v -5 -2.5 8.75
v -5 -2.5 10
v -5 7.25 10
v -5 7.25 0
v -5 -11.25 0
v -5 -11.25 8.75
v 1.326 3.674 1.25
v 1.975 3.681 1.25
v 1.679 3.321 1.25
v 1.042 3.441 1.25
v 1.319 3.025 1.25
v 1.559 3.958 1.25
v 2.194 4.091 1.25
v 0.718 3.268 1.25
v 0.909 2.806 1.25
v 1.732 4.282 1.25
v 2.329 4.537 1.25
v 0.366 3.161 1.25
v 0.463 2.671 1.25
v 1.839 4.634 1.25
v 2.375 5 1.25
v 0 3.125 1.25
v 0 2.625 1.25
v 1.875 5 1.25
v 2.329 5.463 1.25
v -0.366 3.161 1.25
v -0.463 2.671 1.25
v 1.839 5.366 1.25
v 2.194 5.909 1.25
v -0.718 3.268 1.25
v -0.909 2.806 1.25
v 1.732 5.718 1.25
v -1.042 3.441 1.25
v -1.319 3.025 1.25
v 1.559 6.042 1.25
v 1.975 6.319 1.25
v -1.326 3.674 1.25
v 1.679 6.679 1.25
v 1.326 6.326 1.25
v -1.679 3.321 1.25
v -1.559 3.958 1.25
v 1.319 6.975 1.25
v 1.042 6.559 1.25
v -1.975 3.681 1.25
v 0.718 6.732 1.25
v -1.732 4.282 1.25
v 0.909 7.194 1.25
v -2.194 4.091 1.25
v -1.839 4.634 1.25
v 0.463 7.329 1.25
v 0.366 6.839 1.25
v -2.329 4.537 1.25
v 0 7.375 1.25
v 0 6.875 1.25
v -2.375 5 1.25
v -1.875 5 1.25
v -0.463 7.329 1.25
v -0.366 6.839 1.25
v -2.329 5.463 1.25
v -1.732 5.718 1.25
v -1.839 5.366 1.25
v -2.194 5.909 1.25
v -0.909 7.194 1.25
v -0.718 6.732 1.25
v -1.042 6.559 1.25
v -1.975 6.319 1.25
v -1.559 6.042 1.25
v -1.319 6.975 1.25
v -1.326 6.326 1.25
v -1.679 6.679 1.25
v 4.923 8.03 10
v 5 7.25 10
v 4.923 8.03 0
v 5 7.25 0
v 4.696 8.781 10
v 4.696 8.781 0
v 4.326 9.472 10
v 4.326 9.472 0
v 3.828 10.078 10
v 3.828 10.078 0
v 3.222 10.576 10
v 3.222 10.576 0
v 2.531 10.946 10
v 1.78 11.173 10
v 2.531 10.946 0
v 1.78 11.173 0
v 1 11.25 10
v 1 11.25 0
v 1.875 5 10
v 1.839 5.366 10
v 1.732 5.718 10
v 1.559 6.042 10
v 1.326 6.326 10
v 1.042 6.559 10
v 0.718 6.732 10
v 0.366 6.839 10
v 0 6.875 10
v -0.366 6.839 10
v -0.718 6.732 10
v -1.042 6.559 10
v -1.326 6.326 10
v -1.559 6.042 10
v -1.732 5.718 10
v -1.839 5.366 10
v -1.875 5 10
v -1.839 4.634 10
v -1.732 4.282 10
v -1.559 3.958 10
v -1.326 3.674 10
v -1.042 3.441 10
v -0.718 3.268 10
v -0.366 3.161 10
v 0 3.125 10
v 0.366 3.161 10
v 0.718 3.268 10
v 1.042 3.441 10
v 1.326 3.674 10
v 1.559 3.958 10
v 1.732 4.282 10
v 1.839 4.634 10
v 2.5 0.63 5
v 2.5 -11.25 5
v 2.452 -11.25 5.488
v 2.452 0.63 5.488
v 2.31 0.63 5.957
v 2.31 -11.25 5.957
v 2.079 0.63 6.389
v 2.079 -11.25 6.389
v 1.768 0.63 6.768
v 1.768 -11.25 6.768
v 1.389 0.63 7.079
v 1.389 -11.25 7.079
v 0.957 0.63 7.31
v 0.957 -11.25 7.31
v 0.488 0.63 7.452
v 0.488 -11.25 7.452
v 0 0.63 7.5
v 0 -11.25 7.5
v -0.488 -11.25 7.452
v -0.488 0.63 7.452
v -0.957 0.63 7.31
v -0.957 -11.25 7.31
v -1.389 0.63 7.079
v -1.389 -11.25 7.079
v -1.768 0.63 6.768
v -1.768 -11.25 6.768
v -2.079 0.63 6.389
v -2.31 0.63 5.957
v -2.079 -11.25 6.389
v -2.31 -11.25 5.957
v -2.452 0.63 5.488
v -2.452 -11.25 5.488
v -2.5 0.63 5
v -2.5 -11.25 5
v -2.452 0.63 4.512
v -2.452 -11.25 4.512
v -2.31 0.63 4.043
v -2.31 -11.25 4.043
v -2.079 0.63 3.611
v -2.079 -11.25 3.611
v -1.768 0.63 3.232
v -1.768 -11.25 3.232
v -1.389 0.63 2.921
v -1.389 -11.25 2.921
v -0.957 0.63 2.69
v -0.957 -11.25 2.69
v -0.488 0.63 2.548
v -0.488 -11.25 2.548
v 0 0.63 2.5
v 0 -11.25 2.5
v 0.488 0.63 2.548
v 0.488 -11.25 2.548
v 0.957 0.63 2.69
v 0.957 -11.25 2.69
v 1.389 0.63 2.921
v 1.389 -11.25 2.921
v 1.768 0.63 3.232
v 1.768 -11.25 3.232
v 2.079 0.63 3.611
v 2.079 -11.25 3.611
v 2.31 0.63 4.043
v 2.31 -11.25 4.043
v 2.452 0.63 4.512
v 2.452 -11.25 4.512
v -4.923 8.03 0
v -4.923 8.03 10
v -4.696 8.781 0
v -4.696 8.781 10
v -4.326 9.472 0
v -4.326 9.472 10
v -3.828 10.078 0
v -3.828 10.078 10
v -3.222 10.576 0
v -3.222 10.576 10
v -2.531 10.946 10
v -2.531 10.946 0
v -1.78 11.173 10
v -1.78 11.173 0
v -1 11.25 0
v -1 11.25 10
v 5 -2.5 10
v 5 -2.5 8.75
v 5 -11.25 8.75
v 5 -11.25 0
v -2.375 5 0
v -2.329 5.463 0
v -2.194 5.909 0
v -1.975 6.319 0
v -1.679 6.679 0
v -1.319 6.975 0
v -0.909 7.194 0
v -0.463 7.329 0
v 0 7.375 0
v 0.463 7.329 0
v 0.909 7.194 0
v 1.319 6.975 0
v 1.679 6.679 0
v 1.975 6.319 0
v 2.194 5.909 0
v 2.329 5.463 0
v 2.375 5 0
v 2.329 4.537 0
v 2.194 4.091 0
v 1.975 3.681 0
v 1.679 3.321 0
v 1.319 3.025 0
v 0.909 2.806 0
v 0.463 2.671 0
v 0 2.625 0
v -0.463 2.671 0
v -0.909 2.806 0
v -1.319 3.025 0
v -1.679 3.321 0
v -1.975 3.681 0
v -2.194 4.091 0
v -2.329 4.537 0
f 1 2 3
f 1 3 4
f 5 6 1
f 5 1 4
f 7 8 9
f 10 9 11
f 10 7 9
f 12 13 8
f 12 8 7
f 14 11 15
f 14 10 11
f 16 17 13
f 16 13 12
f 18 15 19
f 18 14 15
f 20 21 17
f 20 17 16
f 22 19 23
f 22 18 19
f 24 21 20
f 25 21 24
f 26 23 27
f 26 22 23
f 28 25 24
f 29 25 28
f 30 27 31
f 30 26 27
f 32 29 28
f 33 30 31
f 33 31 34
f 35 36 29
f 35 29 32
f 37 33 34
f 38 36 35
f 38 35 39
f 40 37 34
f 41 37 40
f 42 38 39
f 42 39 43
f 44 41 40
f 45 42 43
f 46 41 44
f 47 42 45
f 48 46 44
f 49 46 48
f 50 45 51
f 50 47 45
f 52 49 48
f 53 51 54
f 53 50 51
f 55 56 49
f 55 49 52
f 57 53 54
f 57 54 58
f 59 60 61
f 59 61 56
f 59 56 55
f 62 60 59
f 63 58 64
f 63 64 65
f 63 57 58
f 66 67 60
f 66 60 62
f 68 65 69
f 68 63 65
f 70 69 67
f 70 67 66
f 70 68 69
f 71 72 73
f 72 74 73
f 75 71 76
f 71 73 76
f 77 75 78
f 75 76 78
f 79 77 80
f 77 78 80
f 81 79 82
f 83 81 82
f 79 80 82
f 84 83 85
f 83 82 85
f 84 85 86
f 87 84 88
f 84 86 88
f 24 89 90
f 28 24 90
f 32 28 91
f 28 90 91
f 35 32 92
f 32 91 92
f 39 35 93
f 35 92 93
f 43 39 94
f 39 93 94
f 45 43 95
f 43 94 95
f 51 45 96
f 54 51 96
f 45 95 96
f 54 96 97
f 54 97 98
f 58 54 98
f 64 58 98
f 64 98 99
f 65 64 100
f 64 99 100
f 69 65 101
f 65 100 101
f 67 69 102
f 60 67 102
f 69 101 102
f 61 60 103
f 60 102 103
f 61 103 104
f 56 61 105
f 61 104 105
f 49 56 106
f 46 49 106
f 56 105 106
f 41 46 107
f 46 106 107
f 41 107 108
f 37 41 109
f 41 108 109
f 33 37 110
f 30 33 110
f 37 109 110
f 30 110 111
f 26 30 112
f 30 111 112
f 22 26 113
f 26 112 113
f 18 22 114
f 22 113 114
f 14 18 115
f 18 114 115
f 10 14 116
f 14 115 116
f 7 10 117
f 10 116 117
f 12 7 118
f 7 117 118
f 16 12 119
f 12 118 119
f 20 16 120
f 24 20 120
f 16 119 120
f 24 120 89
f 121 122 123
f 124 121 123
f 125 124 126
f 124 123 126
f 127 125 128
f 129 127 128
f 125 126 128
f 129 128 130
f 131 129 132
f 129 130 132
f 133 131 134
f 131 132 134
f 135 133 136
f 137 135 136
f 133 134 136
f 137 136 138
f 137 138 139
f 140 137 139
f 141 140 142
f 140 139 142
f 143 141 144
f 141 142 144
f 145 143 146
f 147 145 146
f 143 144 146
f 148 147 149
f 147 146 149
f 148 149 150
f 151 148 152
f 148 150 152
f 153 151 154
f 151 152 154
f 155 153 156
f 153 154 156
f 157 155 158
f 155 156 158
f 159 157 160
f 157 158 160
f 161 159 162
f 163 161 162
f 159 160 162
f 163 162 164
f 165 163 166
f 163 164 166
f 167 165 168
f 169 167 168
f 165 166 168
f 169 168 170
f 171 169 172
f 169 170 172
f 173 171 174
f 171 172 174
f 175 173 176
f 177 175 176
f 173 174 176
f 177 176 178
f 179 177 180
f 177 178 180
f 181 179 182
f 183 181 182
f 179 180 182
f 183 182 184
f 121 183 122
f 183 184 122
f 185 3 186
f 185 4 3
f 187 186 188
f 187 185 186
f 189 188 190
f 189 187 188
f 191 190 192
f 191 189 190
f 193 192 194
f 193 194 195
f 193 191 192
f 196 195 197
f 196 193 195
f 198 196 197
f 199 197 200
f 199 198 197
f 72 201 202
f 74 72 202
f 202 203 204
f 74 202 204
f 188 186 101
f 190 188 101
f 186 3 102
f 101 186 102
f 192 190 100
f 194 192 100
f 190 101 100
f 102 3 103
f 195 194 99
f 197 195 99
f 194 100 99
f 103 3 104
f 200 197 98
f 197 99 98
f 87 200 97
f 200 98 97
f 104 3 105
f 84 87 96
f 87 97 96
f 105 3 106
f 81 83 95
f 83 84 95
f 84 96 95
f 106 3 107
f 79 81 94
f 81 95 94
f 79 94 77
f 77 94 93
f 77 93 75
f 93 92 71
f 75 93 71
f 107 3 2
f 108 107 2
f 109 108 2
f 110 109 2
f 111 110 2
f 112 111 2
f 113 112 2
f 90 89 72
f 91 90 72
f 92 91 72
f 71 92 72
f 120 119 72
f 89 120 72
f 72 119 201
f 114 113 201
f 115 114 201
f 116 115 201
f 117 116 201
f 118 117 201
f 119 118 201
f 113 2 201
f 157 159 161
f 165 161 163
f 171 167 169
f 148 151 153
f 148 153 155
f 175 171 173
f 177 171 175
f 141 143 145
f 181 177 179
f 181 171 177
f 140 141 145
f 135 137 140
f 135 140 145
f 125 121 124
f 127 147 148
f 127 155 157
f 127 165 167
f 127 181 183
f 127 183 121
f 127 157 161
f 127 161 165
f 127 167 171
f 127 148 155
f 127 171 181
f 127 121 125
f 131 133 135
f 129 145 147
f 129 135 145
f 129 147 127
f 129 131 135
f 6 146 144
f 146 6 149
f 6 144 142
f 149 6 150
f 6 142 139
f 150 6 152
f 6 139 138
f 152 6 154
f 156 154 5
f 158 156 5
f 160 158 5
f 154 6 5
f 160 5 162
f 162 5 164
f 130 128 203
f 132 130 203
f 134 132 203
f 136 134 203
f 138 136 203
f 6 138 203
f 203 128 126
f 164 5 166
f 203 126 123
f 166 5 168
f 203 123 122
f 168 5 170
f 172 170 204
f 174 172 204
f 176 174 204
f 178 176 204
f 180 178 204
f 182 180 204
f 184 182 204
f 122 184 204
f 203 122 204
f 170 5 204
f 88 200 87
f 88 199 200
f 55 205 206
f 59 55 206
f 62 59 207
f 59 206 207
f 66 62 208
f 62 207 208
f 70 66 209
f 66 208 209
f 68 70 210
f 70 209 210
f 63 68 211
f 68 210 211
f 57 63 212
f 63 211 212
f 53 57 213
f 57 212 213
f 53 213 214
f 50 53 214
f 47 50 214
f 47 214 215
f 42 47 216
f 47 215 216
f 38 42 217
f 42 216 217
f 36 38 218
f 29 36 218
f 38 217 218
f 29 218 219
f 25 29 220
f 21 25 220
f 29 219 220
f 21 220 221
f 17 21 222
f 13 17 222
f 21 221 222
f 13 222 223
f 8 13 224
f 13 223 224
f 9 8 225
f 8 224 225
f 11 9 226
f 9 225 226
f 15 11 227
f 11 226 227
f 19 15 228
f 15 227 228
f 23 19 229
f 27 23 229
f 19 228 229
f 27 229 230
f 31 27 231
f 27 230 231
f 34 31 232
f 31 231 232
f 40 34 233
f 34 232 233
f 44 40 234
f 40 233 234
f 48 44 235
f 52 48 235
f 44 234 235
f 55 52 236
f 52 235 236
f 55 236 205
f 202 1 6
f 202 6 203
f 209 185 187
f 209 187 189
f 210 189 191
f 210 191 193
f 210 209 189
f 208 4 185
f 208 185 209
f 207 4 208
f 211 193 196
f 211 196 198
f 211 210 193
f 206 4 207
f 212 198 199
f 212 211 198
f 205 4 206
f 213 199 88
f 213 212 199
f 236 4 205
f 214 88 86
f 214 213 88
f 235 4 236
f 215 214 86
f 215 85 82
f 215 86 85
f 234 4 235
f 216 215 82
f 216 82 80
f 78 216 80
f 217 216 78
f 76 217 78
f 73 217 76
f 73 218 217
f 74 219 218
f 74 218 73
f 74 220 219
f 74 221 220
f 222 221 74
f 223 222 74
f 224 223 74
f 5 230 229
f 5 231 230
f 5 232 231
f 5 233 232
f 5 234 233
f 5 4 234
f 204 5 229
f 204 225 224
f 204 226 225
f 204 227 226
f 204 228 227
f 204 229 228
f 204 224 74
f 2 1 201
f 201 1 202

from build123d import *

# Parameters (mm, degrees)
SKETCH2_W           = 10
SKETCH2_H           = 8.75
BOSS_EXTRUDE1_DEPTH = 8.75
SKETCH3_W           = 10
SKETCH3_H           = 10
BOSS_EXTRUDE2_DEPTH = 13.75
FILLET1_R           = 4
SKETCH4_R           = 2.5
CUT_EXTRUDE1_DEPTH  = 11.88
SKETCH5_R           = 1.875
CUT_EXTRUDE2_DEPTH  = 8.75
SKETCH6_R           = 2.375
CUT_EXTRUDE3_DEPTH  = 1.25


with BuildPart() as part:
    # Sketch2 → Boss-Extrude1 (new body)
    with BuildSketch(Plane.XY):
        with Locations((0, -6.875)):
            Rectangle(SKETCH2_W, SKETCH2_H)
    extrude(amount=BOSS_EXTRUDE1_DEPTH)

    # Sketch3 → Boss-Extrude2 (add)
    with BuildSketch(Plane(origin=(0, -2.5, 0), x_dir=(1, 0, 0), z_dir=(0, 1, 0))):
        with Locations((0, -5)):
            Rectangle(SKETCH3_W, SKETCH3_H)
    extrude(amount=BOSS_EXTRUDE2_DEPTH)

    # Fillet1
    fillet1_edges = [part.edges().sort_by_distance(p)[0] for p in [
        (5, 11.25, 5),
        (-5, 11.25, 5),
    ]]
    fillet(fillet1_edges, radius=FILLET1_R)

    # Sketch4 → Cut-Extrude1 (cut)
    with BuildSketch(Plane.XZ.offset(11.25)):
        with Locations((0, 5)):
            Circle(SKETCH4_R)
    extrude(amount=-CUT_EXTRUDE1_DEPTH, mode=Mode.SUBTRACT)

    # Sketch5 → Cut-Extrude2 (cut)
    with BuildSketch(Plane.XY.offset(10)):
        with Locations((0, 5)):
            Circle(SKETCH5_R)
    extrude(amount=-CUT_EXTRUDE2_DEPTH, mode=Mode.SUBTRACT)

    # Sketch6 → Cut-Extrude3 (cut)
    with BuildSketch(Plane(origin=(0, 0, 0), x_dir=(-1, 0, 0), z_dir=(0, 0, -1))):
        with Locations((0, 5)):
            Circle(SKETCH6_R)
    extrude(amount=-CUT_EXTRUDE3_DEPTH, mode=Mode.SUBTRACT)


solid = part.part
